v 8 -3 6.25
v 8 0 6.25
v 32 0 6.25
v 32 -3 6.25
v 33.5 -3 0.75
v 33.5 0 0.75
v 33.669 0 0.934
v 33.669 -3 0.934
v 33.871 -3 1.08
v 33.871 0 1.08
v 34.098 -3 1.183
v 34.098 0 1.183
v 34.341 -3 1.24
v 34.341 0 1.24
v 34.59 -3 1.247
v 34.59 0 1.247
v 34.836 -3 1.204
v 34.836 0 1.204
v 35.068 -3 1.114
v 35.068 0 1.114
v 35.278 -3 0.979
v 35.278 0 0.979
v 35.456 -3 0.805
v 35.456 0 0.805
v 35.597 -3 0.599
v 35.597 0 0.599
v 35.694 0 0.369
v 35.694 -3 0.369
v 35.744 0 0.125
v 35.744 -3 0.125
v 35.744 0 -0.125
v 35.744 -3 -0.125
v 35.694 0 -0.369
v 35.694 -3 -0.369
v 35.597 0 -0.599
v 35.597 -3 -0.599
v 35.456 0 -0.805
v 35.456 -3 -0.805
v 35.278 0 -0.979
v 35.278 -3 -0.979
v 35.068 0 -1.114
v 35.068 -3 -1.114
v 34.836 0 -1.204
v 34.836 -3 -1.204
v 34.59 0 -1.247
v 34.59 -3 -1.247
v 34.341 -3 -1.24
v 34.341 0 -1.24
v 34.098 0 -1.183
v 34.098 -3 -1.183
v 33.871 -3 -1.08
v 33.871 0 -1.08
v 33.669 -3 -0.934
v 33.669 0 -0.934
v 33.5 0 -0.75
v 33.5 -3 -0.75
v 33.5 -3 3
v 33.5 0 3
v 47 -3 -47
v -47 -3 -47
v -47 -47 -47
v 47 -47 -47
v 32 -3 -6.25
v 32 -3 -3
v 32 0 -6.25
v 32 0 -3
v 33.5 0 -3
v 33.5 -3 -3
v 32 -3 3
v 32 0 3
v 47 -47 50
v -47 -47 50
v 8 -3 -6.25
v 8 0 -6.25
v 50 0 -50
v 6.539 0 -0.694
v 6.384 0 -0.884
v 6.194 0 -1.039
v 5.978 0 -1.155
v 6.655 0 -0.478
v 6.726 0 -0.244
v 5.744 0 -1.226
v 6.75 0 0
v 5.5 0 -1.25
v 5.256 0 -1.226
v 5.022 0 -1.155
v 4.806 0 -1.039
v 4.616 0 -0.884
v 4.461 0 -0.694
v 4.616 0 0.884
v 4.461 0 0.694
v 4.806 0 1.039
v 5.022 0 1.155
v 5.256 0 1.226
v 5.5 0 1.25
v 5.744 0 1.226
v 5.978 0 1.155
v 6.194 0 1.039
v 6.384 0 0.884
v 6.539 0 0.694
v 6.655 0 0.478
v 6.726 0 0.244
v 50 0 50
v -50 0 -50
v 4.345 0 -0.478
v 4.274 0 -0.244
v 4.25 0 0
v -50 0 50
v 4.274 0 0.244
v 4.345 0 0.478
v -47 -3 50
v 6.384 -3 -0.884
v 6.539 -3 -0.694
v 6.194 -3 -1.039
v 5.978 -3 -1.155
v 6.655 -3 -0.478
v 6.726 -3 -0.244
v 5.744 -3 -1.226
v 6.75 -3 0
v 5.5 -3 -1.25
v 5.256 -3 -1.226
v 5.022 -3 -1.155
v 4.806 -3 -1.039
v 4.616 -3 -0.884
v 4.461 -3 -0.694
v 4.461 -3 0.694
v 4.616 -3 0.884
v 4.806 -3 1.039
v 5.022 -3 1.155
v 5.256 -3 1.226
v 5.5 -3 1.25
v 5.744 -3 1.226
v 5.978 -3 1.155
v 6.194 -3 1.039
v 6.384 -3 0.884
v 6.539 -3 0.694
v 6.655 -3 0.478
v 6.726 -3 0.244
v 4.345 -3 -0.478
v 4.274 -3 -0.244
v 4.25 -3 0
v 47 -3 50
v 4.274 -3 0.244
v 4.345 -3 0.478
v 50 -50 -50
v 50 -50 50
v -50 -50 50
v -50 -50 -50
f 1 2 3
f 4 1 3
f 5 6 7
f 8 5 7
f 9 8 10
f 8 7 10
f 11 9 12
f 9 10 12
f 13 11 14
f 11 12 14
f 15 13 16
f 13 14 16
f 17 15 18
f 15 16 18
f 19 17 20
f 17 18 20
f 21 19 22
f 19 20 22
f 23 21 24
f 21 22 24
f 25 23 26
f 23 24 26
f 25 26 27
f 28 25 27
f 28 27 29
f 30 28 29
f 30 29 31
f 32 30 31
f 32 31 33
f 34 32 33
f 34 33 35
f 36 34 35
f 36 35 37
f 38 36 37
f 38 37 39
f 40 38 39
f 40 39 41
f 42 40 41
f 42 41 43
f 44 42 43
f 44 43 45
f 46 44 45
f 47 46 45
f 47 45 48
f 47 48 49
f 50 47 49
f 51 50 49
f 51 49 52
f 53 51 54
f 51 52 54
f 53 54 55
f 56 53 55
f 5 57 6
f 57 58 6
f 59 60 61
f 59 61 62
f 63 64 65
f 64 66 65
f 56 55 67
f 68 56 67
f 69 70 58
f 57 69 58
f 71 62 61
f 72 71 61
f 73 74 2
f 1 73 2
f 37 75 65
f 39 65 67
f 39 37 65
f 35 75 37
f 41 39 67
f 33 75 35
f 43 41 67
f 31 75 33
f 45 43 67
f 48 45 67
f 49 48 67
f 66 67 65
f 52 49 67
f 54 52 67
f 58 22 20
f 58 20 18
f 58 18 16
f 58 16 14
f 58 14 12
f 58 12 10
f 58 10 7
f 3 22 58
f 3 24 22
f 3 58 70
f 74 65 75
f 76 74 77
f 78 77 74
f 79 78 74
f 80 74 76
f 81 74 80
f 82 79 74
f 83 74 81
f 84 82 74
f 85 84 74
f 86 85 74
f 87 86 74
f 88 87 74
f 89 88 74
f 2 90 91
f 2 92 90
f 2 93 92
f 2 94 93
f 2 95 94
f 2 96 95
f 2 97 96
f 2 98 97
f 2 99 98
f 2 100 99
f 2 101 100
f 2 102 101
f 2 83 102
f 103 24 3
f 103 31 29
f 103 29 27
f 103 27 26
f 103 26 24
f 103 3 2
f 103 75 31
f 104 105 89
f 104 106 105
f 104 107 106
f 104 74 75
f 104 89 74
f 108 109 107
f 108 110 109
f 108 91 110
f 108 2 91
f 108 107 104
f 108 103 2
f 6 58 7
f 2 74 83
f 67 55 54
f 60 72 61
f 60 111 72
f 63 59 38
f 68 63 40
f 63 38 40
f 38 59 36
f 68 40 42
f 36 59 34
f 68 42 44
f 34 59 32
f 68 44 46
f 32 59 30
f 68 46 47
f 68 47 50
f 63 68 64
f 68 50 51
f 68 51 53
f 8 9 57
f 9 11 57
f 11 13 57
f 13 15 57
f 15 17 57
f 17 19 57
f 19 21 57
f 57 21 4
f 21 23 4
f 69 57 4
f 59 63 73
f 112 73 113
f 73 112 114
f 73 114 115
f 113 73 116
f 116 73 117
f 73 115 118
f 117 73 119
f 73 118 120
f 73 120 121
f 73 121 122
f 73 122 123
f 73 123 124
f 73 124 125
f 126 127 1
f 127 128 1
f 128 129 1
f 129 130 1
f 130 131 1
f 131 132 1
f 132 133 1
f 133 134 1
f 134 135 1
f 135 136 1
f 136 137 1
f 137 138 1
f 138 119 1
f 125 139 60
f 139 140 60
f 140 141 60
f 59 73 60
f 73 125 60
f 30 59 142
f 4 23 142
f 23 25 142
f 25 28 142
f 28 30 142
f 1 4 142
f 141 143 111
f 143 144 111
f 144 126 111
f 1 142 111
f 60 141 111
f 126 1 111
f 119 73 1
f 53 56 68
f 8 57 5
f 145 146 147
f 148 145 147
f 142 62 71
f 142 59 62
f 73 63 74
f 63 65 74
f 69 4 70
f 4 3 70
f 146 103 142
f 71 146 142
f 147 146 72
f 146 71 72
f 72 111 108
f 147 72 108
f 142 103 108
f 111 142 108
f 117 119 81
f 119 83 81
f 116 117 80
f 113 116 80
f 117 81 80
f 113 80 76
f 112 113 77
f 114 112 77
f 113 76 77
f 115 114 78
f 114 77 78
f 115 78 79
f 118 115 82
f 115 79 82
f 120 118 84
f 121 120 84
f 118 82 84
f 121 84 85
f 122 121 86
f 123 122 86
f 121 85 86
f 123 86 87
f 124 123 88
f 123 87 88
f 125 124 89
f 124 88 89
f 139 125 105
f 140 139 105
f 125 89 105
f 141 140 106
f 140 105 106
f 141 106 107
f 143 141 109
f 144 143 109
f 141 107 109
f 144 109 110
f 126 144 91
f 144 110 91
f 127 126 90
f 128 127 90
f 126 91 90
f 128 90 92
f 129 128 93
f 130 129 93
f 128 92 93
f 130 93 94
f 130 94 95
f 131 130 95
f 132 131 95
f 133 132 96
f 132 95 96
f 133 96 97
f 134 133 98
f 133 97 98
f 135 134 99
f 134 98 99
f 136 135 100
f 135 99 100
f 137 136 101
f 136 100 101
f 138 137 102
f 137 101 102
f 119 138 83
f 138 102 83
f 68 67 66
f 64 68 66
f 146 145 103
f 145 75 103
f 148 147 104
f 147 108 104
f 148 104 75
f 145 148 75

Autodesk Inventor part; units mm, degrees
ref_plane "YZ Plane" through (0, 0, 0) normal (1, 0, 0) x (0, 1, 0)
ref_plane "XZ Plane" through (0, 0, 0) normal (0, 1, 0) x (-1, 0, 0)
ref_plane "XY Plane" through (0, 0, 0) normal (0, 0, 1) x (1, 0, 0)
sketch "草圖1" plane through (0, 0, 0) normal (0, 1, 0) x (-1, 0, 0)
  line L0 (-50, 50) -> (50, 50)
  line L1 (50, 50) -> (50, -50)
  line L2 (50, -50) -> (-50, -50)
  line L3 (-50, -50) -> (-50, 50)
  line L4 (-50, 50) -> (50, -50) construction
  line L5 (50, 50) -> (-50, -50) construction
  point P0 (0, 0)
  dimension "d0" = 100
  dimension "d1" = 100
extrude "擠出1" add sketch "草圖1" against normal blind 50
shell "薄殼1" thickness 3 removed faces 1 at (-16.6667, -16.6667, 50)
sketch "草圖2" plane through (0, 0, 0) normal (0, 1, 0) x (1, 0, 0)
  line L0 (50, 50) -> (-50, 50) construction
  line L1 (-50, 50) -> (-50, -50) construction
  line L2 (-50, -50) -> (50, -50) construction
  line L3 (50, -50) -> (50, 50) construction
  line L4 (50, 50) -> (0, 50) construction
  line L5 (20, 30) -> (20, 0) construction
  line L6 (20, 0) -> (50, 0) construction
  line L7 (50, 0) -> (50, 50) construction
  circle A0 centre (20, 0) radius 30 construction
  line L8 (5.5, -6.25) -> (34.5, -6.25) construction
  line L9 (34.5, -6.25) -> (34.5, 6.25) construction
  line L10 (34.5, 6.25) -> (5.5, 6.25) construction
  line L11 (5.5, 6.25) -> (5.5, -6.25) construction
  line L12 (5.5, -6.25) -> (34.5, 6.25) construction
  line L13 (34.5, -6.25) -> (5.5, 6.25) construction
  circle A1 centre (5.5, 0) radius 1.25
  circle A2 centre (34.5, 0) radius 1.25
  point P0 (0, 0)
  dimension "d16" = 60
  dimension "d5" = 29
  dimension "d6" = 12.5
  dimension "d7" = 2.5
extrude "擠出2" cut sketch "草圖2" against normal up to surface (3 mm away)
sketch "草圖3" plane through (0, 0, 0) normal (0, 1, 0) x (1, 0, 0)
  line L0 (8, -6.25) -> (32, -6.25)
  line L1 (32, -6.25) -> (32, 6.25)
  line L2 (32, 6.25) -> (8, 6.25)
  line L3 (8, 6.25) -> (8, -6.25)
  line L4 (8, -6.25) -> (32, 6.25) construction
  line L5 (32, -6.25) -> (8, 6.25) construction
  line L6 (30.5, -3) -> (33.5, -3)
  line L7 (33.5, -3) -> (33.5, 3)
  line L8 (33.5, 3) -> (30.5, 3)
  line L9 (30.5, 3) -> (30.5, -3)
  line L10 (30.5, -3) -> (33.5, 3) construction
  line L11 (33.5, -3) -> (30.5, 3) construction
  point P0 (0, 0)
  point P1 (20, 0)
  point P2 (32, 0)
  point P3 (32, -3)
  point P4 (32, 3)
  dimension "d10" = 24
  dimension "d11" = 12.5
  dimension "d12" = 3
  dimension "d13" = 6
extrude "擠出3" cut sketch "草圖3" against normal up to surface (3 mm away)
properties part number "base_box"
